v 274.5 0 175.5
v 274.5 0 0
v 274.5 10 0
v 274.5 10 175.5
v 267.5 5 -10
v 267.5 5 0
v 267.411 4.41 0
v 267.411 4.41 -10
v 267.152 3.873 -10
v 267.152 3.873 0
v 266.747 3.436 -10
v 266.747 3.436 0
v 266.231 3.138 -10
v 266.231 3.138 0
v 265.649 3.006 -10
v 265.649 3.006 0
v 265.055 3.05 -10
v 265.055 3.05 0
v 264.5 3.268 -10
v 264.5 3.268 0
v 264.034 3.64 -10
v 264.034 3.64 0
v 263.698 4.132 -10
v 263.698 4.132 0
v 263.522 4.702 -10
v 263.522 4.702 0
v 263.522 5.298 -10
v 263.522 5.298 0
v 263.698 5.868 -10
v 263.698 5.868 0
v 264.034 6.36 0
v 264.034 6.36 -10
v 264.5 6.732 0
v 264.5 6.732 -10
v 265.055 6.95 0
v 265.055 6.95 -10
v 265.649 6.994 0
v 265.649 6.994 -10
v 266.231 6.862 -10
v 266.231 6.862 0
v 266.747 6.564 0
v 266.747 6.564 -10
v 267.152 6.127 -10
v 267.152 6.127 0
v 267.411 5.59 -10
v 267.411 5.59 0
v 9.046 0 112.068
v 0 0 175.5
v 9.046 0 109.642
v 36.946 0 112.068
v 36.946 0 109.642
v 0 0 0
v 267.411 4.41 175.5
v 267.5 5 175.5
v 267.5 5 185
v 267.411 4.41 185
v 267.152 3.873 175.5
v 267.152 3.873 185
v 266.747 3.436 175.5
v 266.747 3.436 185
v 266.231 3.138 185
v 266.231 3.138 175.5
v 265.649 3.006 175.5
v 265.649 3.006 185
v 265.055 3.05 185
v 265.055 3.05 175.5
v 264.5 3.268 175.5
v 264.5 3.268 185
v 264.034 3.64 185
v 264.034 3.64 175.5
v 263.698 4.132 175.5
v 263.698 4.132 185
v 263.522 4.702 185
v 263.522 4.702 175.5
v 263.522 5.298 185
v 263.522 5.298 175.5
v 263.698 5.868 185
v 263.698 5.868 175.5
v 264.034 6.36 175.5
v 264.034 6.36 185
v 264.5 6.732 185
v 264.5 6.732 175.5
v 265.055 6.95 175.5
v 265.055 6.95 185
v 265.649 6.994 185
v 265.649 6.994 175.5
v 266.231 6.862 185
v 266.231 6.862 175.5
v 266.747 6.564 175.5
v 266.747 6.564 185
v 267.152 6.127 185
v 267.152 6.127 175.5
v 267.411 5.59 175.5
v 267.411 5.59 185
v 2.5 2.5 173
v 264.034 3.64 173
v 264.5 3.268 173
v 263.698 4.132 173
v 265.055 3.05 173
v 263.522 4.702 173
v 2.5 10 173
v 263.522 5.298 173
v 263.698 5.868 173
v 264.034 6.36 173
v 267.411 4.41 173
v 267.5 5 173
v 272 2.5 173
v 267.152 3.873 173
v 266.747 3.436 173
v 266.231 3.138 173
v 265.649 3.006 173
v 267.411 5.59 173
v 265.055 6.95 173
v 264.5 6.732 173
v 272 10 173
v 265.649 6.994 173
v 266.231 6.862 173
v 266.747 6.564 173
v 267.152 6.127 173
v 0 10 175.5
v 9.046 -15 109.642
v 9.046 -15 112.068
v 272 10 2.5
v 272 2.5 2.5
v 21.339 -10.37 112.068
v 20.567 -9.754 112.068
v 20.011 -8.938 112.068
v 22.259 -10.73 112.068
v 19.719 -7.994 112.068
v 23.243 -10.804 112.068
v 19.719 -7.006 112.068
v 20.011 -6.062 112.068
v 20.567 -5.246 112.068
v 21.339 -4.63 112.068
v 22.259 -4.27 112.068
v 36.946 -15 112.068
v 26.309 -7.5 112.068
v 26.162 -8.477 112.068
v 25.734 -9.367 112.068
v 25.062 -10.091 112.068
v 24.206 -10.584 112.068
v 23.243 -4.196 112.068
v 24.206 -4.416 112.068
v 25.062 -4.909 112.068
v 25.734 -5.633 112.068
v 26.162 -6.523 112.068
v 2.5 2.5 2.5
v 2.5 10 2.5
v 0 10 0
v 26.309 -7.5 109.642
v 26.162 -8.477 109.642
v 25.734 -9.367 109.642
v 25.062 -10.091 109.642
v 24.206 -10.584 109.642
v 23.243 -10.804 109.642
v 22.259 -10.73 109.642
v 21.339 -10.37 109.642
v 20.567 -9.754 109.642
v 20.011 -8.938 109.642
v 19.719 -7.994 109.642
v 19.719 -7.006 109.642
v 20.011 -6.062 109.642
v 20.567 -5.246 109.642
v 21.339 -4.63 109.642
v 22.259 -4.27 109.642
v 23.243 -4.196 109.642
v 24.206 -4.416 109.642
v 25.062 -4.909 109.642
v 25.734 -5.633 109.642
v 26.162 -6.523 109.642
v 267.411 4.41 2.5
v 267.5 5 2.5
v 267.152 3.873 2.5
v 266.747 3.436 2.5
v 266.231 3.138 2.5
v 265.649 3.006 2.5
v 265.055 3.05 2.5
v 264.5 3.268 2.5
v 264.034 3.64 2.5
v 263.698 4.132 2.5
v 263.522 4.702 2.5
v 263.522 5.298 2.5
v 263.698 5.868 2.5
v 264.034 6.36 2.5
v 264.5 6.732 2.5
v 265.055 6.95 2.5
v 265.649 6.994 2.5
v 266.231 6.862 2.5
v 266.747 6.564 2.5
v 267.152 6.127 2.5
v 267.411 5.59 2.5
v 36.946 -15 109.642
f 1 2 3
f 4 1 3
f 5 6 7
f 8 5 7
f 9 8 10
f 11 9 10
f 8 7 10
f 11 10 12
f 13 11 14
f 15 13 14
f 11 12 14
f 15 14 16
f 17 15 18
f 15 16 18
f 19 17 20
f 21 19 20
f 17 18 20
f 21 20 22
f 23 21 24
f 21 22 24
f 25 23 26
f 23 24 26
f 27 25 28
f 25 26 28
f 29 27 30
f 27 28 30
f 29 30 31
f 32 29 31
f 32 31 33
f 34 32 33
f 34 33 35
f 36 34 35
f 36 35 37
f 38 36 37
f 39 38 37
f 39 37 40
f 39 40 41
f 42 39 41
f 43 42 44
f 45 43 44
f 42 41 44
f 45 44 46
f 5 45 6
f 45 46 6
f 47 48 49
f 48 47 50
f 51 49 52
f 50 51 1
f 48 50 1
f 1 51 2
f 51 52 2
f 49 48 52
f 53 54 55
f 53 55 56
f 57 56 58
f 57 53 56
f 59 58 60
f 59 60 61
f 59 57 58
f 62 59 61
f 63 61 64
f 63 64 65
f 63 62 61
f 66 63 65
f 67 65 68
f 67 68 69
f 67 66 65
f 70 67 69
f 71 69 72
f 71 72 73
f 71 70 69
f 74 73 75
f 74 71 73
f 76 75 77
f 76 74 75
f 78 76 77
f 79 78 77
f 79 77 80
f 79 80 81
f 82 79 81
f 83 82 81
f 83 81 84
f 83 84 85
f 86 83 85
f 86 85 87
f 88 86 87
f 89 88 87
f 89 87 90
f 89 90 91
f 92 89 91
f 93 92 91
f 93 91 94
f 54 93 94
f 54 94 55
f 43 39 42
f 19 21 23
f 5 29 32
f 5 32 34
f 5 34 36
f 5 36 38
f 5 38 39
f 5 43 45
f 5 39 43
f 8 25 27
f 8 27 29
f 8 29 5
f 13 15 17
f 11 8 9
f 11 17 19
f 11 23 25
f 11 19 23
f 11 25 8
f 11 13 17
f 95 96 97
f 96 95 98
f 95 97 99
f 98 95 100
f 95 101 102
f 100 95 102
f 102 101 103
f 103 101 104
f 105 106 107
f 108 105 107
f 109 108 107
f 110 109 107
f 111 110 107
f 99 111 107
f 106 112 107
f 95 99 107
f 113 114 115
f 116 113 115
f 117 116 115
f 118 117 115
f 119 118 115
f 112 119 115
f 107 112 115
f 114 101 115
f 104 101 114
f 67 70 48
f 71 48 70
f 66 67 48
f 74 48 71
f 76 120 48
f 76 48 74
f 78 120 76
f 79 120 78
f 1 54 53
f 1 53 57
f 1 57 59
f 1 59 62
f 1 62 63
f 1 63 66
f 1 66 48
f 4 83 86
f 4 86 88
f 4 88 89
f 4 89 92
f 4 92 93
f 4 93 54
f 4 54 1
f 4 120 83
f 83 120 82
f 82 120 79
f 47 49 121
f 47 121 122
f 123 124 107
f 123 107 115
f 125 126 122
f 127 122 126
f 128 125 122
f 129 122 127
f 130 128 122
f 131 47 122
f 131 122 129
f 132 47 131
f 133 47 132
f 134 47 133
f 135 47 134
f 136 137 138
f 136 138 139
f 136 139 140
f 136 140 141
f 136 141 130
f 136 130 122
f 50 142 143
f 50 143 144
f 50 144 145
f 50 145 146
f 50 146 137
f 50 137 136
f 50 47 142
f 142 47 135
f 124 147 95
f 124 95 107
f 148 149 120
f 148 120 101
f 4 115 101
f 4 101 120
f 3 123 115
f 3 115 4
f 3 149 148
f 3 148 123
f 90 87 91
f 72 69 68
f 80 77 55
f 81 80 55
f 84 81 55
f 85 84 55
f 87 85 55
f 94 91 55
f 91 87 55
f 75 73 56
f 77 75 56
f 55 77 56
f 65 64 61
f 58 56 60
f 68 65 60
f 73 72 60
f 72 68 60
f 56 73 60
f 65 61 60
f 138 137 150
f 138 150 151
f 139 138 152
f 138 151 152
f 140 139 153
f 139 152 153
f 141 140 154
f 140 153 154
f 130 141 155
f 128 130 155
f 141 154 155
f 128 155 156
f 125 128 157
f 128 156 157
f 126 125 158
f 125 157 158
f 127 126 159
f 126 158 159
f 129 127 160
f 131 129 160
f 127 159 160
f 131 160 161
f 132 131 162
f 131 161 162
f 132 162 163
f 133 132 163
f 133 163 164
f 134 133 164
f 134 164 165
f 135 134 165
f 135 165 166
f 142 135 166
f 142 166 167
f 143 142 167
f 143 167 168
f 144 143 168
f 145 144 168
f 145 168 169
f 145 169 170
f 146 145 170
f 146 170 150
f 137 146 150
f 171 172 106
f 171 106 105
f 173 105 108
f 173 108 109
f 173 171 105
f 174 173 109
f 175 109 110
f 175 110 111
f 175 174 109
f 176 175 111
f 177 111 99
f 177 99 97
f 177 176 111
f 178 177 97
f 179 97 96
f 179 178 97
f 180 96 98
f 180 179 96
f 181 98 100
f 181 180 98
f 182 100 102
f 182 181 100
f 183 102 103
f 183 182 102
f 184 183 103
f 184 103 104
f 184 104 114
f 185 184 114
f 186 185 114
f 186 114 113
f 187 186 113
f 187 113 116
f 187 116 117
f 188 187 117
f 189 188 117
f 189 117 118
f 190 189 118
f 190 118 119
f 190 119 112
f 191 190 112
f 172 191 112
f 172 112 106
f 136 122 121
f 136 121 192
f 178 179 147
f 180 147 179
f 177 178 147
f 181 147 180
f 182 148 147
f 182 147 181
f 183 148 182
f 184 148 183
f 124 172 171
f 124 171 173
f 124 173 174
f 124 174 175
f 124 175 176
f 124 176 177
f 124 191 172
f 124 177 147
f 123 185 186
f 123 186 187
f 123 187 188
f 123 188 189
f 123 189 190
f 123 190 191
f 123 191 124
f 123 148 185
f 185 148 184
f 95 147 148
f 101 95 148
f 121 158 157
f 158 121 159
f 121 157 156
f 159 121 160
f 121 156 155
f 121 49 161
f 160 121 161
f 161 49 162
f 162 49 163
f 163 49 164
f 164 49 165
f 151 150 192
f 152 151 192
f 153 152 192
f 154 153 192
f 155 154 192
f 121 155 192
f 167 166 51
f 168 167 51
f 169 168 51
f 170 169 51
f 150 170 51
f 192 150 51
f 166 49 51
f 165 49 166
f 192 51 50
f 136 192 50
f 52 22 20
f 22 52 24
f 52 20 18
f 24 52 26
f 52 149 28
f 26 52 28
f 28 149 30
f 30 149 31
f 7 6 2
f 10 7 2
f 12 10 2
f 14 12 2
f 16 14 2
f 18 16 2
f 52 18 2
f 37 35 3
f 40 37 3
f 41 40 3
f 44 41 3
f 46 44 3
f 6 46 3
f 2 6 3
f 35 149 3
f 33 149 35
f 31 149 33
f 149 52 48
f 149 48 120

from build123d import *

# Parameters (mm, degrees)
F0_W          = 274.5
F0_H          = 10
F1_DEPTH      = 175.5
F2_T          = -2.5
F3_R          = 2
F4_DEPTH      = 10
F4_DEPTH_BACK = 185
F5_W          = 27.900162
F5_H          = 2.426103
F6_DEPTH      = 15
F7_R          = 3.313437
F8_DEPTH      = 25


with BuildPart() as f1:
    # F0 (on Top) → F1 (new body)
    with BuildSketch(Plane.XY):
        with Locations((137.25, 5)):
            Rectangle(F0_W, F0_H)
    extrude(amount=F1_DEPTH)

    # F2
    f2_openings = [f1.faces().sort_by_distance(p)[0] for p in [
        (137.25, 10, 87.75),
    ]]
    offset(amount=F2_T, openings=f2_openings)

    # F3 (on face) → F4 (join, two sides)
    with BuildSketch(Plane(origin=(0, 0, 0), x_dir=(1, 0, 0), z_dir=(0, 0, -1))) as f4_sk:
        with Locations((265.5, -5)):
            Circle(F3_R)
    extrude(amount=F4_DEPTH)
    extrude(f4_sk.sketch, amount=-F4_DEPTH_BACK)

    # F5 (on face) → F6 (join)
    with BuildSketch(Plane.XZ):
        with Locations((22.99581, 110.854611)):
            Rectangle(F5_W, F5_H)
    extrude(amount=F6_DEPTH)

    # F7 (on face) → F8 (cut)
    with BuildSketch(Plane(origin=(0, 0, 109.641559), x_dir=(1, 0, 0), z_dir=(0, 0, -1))):
        with Locations((22.99581, 7.5)):
            Circle(F7_R)
    extrude(amount=-F8_DEPTH, mode=Mode.SUBTRACT)


solid = f1.part
